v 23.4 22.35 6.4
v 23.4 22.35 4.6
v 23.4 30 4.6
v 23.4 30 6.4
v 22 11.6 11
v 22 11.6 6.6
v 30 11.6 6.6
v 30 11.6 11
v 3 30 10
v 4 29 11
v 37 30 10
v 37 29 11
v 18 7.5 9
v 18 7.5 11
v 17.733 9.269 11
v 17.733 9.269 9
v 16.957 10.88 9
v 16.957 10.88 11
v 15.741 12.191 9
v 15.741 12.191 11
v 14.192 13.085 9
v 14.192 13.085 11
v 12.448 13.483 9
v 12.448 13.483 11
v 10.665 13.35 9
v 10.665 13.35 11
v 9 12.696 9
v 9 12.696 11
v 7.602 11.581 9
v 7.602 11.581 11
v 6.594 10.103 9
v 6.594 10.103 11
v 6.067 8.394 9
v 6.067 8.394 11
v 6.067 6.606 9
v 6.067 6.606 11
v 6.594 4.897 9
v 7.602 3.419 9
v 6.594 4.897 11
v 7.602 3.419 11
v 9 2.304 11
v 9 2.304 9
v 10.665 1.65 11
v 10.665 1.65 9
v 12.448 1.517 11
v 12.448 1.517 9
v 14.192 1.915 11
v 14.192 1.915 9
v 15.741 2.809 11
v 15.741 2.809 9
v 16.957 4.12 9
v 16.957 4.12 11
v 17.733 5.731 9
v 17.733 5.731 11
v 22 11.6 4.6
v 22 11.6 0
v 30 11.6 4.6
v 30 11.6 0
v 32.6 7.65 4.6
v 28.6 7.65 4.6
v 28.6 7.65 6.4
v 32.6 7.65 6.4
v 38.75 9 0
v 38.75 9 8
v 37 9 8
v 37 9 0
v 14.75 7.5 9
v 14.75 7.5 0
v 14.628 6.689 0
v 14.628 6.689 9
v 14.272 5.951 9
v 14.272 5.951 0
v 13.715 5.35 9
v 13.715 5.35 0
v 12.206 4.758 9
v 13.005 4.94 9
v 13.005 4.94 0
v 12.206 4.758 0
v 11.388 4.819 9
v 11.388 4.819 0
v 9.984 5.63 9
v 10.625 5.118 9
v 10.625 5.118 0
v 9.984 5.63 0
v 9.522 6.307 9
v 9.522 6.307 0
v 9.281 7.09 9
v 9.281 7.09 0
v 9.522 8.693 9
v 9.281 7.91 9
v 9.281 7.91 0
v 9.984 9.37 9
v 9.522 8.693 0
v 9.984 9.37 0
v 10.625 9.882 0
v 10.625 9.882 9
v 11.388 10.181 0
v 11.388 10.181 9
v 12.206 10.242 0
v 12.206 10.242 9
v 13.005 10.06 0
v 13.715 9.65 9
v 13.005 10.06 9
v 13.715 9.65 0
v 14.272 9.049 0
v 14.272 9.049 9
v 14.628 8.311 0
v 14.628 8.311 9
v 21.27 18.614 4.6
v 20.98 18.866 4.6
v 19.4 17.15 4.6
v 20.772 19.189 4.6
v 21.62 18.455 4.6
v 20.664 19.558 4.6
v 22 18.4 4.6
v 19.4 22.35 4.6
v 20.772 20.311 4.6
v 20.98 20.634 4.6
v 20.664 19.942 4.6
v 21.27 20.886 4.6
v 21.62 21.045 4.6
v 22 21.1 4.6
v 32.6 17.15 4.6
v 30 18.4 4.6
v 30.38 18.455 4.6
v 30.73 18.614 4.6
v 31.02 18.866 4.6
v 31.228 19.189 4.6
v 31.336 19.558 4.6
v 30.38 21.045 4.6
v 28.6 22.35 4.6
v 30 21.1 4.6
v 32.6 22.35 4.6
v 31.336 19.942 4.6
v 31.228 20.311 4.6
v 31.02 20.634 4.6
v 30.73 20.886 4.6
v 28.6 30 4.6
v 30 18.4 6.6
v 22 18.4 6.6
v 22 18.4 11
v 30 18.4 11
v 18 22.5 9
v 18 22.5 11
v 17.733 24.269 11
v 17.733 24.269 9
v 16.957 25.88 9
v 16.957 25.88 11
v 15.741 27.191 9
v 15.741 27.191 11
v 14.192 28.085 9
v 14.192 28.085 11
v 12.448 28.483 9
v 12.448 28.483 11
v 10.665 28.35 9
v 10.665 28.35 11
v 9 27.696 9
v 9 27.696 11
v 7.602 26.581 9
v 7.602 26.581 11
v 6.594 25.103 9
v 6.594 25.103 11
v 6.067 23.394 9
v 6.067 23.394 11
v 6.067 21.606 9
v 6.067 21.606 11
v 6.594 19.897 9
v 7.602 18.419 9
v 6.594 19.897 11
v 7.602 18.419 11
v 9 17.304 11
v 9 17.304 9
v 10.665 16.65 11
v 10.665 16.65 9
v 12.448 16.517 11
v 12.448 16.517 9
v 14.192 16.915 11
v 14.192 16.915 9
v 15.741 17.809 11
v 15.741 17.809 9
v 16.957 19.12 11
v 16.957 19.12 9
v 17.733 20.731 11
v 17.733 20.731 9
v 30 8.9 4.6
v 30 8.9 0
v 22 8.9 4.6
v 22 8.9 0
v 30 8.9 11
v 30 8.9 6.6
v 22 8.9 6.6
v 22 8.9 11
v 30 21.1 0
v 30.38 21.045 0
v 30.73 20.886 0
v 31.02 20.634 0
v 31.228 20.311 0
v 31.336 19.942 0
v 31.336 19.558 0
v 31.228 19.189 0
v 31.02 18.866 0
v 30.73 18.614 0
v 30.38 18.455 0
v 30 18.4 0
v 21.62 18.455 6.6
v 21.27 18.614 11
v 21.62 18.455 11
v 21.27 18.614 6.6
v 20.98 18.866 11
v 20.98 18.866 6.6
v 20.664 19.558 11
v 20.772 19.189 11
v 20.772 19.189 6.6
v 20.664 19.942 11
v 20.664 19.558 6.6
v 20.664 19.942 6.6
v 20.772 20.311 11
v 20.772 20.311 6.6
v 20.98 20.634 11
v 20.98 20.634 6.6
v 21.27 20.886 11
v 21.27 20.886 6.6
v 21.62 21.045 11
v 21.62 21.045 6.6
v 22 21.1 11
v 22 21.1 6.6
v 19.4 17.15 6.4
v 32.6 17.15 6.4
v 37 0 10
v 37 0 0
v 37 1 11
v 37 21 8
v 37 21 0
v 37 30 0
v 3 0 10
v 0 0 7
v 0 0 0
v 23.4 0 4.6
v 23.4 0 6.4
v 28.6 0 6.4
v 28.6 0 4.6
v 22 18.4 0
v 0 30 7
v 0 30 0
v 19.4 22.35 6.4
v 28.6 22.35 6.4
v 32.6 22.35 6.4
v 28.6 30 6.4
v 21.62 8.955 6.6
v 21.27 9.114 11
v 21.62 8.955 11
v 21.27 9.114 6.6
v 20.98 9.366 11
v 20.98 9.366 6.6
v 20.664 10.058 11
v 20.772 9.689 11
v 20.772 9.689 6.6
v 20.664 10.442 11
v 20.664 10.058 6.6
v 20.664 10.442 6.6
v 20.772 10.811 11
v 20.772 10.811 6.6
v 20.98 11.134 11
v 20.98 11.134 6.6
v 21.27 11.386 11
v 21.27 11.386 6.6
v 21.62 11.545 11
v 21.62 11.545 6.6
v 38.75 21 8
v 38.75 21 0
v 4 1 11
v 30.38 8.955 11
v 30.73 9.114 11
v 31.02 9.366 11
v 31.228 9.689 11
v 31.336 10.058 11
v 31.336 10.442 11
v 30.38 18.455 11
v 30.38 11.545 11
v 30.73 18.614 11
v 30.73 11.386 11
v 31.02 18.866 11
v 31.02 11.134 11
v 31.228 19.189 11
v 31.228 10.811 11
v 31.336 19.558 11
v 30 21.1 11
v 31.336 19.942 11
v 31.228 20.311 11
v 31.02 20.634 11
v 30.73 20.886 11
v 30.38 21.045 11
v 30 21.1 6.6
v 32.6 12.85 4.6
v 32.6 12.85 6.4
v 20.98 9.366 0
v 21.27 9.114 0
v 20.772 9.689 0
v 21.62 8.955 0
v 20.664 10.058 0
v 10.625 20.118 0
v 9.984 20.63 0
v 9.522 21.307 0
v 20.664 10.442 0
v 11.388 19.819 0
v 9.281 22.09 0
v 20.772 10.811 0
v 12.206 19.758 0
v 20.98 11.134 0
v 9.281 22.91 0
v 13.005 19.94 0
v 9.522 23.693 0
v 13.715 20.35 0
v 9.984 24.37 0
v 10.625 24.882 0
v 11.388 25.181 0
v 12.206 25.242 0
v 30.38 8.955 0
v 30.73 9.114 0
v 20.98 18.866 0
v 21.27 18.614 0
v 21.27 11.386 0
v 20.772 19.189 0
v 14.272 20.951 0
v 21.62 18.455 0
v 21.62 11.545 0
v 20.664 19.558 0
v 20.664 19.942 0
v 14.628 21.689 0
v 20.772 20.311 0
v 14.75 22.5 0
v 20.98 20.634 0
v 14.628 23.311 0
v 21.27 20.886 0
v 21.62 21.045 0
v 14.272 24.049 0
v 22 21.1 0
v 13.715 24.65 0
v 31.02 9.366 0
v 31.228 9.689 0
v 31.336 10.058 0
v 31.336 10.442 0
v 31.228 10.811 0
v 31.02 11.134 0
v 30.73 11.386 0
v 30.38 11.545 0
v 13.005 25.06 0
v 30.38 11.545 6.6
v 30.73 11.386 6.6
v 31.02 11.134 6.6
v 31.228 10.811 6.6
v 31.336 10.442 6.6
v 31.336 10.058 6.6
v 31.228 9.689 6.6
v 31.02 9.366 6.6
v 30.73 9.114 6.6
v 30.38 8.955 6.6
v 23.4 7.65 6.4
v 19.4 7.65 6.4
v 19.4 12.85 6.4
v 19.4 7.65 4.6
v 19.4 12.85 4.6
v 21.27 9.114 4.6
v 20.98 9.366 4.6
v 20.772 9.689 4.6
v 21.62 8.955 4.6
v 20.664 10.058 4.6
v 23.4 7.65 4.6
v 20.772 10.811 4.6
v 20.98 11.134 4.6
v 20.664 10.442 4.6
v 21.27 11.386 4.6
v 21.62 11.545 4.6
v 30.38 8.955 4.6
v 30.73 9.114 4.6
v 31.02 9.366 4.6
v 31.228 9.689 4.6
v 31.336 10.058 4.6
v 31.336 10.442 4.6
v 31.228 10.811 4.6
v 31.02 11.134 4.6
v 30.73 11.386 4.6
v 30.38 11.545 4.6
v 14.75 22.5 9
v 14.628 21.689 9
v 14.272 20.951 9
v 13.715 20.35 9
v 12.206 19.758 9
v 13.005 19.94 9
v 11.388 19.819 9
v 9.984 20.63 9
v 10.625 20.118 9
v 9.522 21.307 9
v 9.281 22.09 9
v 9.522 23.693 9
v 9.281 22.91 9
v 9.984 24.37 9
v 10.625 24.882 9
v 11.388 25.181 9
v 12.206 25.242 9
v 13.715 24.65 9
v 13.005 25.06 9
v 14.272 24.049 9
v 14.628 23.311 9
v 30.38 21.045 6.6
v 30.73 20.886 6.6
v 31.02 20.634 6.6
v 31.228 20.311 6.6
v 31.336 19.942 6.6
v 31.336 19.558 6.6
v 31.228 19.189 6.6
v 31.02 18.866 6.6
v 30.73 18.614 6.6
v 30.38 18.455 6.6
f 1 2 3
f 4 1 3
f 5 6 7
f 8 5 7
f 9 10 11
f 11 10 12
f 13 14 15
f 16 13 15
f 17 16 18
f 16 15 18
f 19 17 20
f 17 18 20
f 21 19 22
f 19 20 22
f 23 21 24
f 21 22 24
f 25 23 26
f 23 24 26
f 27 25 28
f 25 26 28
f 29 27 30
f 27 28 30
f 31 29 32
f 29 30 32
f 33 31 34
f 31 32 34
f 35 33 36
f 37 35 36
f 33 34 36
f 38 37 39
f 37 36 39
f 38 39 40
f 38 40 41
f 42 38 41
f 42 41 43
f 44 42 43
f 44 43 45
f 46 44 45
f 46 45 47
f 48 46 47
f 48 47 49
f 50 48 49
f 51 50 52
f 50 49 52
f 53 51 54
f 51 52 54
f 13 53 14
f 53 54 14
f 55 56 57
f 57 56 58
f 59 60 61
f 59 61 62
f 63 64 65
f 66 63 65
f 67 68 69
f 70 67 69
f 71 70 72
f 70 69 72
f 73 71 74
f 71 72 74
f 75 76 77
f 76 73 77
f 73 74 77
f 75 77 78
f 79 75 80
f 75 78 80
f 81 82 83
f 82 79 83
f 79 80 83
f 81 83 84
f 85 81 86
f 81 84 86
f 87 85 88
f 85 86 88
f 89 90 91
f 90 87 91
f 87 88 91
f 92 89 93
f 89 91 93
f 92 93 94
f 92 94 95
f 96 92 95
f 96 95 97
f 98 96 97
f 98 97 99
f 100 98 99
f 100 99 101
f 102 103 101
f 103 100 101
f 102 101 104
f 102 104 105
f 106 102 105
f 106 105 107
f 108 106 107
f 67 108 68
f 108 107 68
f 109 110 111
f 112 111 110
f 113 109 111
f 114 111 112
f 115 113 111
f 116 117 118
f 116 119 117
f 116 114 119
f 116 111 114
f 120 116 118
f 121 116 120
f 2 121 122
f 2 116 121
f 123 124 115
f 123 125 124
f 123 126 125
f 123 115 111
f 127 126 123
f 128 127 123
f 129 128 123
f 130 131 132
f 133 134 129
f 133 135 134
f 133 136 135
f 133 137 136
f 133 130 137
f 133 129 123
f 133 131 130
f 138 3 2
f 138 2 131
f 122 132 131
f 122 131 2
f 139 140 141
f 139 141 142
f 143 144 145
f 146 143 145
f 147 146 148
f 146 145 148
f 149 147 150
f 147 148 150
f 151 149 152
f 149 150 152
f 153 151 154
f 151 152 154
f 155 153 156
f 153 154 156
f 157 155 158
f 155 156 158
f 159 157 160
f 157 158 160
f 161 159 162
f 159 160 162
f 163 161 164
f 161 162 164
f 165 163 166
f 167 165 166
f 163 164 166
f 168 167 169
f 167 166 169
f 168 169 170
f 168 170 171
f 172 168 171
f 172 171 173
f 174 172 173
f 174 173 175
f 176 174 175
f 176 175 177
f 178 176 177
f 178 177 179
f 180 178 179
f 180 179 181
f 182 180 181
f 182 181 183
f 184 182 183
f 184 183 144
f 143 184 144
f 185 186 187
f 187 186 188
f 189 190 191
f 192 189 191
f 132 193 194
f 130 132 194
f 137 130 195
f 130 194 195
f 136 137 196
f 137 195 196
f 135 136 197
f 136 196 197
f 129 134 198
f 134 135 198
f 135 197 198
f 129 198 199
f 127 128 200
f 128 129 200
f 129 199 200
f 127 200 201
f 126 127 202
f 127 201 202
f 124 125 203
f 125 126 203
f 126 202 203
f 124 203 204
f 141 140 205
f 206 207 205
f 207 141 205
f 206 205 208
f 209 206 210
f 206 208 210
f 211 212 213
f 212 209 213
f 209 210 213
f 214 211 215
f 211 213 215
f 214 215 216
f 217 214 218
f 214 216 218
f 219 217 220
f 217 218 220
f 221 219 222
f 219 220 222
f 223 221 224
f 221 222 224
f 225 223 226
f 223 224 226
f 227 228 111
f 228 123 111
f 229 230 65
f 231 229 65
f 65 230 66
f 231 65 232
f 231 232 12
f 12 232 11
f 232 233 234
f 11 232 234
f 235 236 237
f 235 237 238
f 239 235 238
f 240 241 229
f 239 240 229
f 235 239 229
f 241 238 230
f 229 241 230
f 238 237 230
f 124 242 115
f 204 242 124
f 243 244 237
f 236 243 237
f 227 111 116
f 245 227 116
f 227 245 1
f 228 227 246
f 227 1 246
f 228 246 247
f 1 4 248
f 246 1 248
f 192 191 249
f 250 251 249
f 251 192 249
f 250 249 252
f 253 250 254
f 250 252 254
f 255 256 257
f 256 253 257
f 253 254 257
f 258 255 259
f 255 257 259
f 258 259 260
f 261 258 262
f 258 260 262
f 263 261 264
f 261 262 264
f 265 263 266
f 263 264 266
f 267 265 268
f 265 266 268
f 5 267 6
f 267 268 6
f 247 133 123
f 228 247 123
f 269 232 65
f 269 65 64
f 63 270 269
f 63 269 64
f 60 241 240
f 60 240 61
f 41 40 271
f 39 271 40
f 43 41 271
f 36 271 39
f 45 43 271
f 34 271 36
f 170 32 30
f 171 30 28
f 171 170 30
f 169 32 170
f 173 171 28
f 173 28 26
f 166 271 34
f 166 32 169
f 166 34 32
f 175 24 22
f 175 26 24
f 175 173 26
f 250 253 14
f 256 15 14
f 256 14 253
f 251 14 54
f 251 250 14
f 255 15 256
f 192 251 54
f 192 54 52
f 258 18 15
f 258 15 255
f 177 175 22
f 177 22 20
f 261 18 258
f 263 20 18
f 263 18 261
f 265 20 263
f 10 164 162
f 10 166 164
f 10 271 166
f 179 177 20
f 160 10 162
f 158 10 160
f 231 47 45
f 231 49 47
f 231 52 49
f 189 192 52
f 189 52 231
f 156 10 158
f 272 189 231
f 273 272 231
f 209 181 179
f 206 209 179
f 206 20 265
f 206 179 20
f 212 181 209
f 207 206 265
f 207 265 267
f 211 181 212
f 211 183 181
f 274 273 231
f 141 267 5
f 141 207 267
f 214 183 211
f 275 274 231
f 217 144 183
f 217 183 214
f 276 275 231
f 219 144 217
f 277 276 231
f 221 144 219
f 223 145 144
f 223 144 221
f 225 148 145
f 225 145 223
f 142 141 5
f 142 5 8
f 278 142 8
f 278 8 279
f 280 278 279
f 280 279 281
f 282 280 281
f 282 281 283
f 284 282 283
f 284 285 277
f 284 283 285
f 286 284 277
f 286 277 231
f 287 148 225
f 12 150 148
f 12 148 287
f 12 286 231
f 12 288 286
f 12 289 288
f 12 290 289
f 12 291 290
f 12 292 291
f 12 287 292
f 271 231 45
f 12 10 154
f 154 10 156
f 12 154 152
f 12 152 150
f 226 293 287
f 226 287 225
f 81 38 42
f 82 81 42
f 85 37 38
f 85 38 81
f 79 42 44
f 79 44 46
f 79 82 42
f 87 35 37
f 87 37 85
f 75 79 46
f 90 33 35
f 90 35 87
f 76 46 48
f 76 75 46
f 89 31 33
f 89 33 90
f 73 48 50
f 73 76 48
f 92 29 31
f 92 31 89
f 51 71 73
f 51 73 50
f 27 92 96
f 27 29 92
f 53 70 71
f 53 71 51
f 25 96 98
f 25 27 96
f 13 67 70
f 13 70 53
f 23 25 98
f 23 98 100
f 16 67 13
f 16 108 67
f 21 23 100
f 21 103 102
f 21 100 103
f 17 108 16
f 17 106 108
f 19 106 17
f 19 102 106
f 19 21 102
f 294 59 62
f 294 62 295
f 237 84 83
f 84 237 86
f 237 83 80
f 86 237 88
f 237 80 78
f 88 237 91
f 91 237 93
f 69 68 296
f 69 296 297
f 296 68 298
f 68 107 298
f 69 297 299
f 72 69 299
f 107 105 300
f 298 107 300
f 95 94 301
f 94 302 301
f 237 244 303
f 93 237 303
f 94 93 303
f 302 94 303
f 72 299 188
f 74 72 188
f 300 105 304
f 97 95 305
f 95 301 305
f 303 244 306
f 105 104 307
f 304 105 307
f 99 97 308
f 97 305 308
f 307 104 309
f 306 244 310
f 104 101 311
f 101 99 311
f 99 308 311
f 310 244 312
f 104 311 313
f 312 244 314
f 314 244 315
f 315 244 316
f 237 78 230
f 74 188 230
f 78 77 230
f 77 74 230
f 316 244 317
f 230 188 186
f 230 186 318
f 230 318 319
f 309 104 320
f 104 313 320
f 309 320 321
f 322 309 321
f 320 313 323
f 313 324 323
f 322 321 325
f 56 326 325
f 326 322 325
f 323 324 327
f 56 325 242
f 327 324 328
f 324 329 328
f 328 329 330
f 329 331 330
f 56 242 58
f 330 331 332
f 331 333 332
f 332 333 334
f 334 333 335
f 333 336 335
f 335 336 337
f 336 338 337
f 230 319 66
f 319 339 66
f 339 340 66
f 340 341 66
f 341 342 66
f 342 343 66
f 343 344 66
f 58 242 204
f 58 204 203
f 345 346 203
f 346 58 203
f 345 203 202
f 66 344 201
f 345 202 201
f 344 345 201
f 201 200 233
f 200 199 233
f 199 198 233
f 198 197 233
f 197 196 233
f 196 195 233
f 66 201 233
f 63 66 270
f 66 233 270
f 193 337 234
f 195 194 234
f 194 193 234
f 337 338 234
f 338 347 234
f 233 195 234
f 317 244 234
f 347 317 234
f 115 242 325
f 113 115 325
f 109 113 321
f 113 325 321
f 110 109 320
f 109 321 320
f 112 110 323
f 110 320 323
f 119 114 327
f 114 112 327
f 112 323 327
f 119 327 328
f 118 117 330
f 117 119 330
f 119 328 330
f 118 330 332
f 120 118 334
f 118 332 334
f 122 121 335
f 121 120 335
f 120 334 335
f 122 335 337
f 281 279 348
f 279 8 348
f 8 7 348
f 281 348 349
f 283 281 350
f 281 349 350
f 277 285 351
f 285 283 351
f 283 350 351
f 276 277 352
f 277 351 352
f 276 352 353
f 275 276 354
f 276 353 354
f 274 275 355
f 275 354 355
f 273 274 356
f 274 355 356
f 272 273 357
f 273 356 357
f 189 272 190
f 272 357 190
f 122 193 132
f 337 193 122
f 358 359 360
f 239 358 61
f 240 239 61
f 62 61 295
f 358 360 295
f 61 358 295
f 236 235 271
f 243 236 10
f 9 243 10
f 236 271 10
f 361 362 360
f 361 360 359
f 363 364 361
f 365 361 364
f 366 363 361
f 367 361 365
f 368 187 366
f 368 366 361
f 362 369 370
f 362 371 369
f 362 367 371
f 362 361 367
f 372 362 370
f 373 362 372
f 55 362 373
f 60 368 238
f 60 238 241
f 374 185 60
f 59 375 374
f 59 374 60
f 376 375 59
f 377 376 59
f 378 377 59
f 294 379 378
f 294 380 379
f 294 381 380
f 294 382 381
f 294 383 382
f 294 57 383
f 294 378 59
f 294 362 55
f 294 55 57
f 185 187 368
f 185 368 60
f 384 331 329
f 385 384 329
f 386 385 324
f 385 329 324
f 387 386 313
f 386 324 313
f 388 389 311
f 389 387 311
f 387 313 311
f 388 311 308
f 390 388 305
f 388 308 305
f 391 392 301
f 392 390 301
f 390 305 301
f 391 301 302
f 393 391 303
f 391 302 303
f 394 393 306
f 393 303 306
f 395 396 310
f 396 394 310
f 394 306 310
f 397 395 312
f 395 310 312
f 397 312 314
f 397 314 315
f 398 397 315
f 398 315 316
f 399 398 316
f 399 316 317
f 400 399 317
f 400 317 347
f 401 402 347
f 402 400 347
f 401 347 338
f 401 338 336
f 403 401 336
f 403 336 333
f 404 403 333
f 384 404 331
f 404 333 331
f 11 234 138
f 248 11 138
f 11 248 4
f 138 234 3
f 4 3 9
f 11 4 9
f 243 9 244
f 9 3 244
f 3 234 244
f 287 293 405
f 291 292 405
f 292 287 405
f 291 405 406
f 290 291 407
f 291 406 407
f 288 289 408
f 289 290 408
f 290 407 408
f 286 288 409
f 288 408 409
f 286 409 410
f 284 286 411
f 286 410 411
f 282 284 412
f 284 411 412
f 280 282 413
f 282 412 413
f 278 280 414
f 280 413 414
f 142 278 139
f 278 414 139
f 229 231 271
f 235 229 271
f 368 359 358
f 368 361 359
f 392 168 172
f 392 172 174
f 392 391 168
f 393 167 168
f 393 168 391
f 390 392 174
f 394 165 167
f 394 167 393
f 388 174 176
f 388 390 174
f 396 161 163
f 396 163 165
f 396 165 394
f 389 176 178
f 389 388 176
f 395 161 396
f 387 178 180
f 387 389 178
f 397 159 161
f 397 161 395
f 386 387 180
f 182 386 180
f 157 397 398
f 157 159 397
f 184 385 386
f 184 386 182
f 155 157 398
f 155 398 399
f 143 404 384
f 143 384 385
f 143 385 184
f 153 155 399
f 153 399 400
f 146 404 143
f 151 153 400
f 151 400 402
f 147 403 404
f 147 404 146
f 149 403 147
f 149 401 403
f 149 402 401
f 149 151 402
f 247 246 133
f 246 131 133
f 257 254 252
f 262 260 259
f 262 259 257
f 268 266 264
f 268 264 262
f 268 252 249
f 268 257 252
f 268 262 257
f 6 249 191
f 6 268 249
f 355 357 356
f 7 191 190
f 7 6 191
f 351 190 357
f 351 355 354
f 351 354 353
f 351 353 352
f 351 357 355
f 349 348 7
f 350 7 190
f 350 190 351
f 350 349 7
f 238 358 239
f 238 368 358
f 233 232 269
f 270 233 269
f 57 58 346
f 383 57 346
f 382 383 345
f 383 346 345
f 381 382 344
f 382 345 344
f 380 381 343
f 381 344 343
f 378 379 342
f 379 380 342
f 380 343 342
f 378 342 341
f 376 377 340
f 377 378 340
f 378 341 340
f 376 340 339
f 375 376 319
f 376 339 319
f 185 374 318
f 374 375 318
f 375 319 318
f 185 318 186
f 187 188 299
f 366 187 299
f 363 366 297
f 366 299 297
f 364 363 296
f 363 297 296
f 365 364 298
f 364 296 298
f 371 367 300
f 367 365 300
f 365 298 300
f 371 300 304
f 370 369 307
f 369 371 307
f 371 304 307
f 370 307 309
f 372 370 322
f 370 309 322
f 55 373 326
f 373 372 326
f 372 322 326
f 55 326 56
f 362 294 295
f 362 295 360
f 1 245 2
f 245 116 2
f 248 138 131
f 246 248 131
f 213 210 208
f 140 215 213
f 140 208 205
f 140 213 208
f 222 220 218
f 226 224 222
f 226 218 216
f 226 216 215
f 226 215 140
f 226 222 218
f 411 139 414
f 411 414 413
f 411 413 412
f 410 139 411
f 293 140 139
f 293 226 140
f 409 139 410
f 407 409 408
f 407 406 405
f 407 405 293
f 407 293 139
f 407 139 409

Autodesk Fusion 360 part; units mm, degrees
sketch "Sketch1" plane through (0, 0, 0) normal (0, 0, 1) x (1, 0, 0)
  line L0 (0, 0) -> (37, 0)
  line L1 (37, 0) -> (37, 30)
  line L2 (37, 30) -> (0, 30)
  line L3 (0, 30) -> (0, 0)
  circle A0 centre (12, 22.5) radius 2.75
  circle A1 centre (12, 7.5) radius 2.75
  line L4 (12, 30) -> (12, 0) construction
  line L5 (12, 15) -> (37, 15) construction
  circle A2 centre (12, 22.5) radius 6
  circle A3 centre (12, 7.5) radius 6
  line L6 (37, 21) -> (38.75, 21)
  line L7 (38.75, 21) -> (38.75, 9)
  line L8 (38.75, 9) -> (37, 9)
  line L9 (30, 21.1) -> (22, 21.1)
  arc A4 (22, 21.1) -> (22, 18.4) centre (22, 19.75) ccw
  line L10 (22, 18.4) -> (30, 18.4)
  arc A5 (30, 18.4) -> (30, 21.1) centre (30, 19.75) ccw
  line L11 (30, 19.75) -> (22, 19.75) construction
  line L12 (30, 19.75) -> (22, 19.75) construction
  line L13 (22, 11.6) -> (30, 11.6)
  arc A6 (30, 8.9) -> (30, 11.6) centre (30, 10.25) ccw
  arc A7 (22, 11.6) -> (22, 8.9) centre (22, 10.25) ccw
  line L14 (30, 8.9) -> (22, 8.9)
  line L15 (27.5, 25) -> (37, 25) construction
  line L16 (37, 25) -> (37, 5) construction
  line L17 (37, 5) -> (27.5, 5) construction
  line L18 (27.5, 5) -> (27.5, 25) construction
  line L19 (19.4, 22.35) -> (32.6, 22.35)
  line L20 (32.6, 22.35) -> (32.6, 17.15)
  line L21 (32.6, 17.15) -> (19.4, 17.15)
  line L22 (19.4, 17.15) -> (19.4, 22.35)
  line L23 (26, 19.75) -> (26, 22.35) construction
  line L24 (22, 19.75) -> (19.4, 19.75) construction
  line L25 (32.6, 12.85) -> (19.4, 12.85)
  line L26 (19.4, 12.85) -> (19.4, 7.65)
  line L27 (32.6, 7.65) -> (32.6, 12.85)
  line L28 (19.4, 7.65) -> (32.6, 7.65)
  line L29 (23.4, 22.35) -> (23.4, 30)
  line L30 (28.6, 30) -> (28.6, 22.35)
  line L31 (23.4, 7.65) -> (23.4, 0)
  line L32 (28.6, 0) -> (28.6, 7.65)
  dimension "d1" = 15
  dimension "d2" = 5.5
  dimension "d3" = 12
  dimension "d4" = 1.75
  dimension "d5" = 12
  dimension "d14" = 2.7
  dimension "d16" = 9.5
  dimension "d17" = 30
  dimension "d19" = 8
  dimension "d20" = 7
  dimension "d22" = 9.5
  dimension "d23" = 20
  dimension "d24" = 10
  dimension "d25" = 12
  dimension "d26" = 5.2
  dimension "d27" = 2.6
  dimension "d28" = 5.2
extrude "Extrude1" add sketch "Sketch1" along normal blind 11 contours L0 L1 L2 L3 L19 L20 L21 L22 L25 L26 L27 L28 L29 L30 L31 L32 | L0 L28 L31 L32 | L25 L26 L27 L28 | L2 L19 L29 L30 | L19 L20 L21 L22 | A2 | A3
extrude "Extrude2" add sketch "Sketch1" along normal blind 8 contours L1 L6 L7 L8
extrude "Extrude3" cut sketch "Sketch1" against normal blind 2 from surface at 11 contours A2 | A3
chamfer "Chamfer2" distance 1 angle 45 2 edges at (18.5, 0, 11) (18.5, 30, 11)
chamfer "Chamfer1" distance 4 angle 45 1 edges at (0, 15, 11)
ref_plane "WorkPlane1" through (18.5, 15, 5.5) normal (0, 0, 1) x (1, 0, 0)
extrude "Extrude4" cut sketch "Sketch1" along normal mid plane 1.8 from surface at 5.5 contours L0 L28 L31 L32 | L25 L26 L27 L28 | L2 L19 L29 L30 | L19 L20 L21 L22
extrude "Extrude5" add sketch "Sketch1" along normal blind 0.2 from surface at 6.4 contours L9 A4 L10 A5 | L13 A6 A7 L14
equation "d27 = d26 / 2"
equation "d28 = d26"
